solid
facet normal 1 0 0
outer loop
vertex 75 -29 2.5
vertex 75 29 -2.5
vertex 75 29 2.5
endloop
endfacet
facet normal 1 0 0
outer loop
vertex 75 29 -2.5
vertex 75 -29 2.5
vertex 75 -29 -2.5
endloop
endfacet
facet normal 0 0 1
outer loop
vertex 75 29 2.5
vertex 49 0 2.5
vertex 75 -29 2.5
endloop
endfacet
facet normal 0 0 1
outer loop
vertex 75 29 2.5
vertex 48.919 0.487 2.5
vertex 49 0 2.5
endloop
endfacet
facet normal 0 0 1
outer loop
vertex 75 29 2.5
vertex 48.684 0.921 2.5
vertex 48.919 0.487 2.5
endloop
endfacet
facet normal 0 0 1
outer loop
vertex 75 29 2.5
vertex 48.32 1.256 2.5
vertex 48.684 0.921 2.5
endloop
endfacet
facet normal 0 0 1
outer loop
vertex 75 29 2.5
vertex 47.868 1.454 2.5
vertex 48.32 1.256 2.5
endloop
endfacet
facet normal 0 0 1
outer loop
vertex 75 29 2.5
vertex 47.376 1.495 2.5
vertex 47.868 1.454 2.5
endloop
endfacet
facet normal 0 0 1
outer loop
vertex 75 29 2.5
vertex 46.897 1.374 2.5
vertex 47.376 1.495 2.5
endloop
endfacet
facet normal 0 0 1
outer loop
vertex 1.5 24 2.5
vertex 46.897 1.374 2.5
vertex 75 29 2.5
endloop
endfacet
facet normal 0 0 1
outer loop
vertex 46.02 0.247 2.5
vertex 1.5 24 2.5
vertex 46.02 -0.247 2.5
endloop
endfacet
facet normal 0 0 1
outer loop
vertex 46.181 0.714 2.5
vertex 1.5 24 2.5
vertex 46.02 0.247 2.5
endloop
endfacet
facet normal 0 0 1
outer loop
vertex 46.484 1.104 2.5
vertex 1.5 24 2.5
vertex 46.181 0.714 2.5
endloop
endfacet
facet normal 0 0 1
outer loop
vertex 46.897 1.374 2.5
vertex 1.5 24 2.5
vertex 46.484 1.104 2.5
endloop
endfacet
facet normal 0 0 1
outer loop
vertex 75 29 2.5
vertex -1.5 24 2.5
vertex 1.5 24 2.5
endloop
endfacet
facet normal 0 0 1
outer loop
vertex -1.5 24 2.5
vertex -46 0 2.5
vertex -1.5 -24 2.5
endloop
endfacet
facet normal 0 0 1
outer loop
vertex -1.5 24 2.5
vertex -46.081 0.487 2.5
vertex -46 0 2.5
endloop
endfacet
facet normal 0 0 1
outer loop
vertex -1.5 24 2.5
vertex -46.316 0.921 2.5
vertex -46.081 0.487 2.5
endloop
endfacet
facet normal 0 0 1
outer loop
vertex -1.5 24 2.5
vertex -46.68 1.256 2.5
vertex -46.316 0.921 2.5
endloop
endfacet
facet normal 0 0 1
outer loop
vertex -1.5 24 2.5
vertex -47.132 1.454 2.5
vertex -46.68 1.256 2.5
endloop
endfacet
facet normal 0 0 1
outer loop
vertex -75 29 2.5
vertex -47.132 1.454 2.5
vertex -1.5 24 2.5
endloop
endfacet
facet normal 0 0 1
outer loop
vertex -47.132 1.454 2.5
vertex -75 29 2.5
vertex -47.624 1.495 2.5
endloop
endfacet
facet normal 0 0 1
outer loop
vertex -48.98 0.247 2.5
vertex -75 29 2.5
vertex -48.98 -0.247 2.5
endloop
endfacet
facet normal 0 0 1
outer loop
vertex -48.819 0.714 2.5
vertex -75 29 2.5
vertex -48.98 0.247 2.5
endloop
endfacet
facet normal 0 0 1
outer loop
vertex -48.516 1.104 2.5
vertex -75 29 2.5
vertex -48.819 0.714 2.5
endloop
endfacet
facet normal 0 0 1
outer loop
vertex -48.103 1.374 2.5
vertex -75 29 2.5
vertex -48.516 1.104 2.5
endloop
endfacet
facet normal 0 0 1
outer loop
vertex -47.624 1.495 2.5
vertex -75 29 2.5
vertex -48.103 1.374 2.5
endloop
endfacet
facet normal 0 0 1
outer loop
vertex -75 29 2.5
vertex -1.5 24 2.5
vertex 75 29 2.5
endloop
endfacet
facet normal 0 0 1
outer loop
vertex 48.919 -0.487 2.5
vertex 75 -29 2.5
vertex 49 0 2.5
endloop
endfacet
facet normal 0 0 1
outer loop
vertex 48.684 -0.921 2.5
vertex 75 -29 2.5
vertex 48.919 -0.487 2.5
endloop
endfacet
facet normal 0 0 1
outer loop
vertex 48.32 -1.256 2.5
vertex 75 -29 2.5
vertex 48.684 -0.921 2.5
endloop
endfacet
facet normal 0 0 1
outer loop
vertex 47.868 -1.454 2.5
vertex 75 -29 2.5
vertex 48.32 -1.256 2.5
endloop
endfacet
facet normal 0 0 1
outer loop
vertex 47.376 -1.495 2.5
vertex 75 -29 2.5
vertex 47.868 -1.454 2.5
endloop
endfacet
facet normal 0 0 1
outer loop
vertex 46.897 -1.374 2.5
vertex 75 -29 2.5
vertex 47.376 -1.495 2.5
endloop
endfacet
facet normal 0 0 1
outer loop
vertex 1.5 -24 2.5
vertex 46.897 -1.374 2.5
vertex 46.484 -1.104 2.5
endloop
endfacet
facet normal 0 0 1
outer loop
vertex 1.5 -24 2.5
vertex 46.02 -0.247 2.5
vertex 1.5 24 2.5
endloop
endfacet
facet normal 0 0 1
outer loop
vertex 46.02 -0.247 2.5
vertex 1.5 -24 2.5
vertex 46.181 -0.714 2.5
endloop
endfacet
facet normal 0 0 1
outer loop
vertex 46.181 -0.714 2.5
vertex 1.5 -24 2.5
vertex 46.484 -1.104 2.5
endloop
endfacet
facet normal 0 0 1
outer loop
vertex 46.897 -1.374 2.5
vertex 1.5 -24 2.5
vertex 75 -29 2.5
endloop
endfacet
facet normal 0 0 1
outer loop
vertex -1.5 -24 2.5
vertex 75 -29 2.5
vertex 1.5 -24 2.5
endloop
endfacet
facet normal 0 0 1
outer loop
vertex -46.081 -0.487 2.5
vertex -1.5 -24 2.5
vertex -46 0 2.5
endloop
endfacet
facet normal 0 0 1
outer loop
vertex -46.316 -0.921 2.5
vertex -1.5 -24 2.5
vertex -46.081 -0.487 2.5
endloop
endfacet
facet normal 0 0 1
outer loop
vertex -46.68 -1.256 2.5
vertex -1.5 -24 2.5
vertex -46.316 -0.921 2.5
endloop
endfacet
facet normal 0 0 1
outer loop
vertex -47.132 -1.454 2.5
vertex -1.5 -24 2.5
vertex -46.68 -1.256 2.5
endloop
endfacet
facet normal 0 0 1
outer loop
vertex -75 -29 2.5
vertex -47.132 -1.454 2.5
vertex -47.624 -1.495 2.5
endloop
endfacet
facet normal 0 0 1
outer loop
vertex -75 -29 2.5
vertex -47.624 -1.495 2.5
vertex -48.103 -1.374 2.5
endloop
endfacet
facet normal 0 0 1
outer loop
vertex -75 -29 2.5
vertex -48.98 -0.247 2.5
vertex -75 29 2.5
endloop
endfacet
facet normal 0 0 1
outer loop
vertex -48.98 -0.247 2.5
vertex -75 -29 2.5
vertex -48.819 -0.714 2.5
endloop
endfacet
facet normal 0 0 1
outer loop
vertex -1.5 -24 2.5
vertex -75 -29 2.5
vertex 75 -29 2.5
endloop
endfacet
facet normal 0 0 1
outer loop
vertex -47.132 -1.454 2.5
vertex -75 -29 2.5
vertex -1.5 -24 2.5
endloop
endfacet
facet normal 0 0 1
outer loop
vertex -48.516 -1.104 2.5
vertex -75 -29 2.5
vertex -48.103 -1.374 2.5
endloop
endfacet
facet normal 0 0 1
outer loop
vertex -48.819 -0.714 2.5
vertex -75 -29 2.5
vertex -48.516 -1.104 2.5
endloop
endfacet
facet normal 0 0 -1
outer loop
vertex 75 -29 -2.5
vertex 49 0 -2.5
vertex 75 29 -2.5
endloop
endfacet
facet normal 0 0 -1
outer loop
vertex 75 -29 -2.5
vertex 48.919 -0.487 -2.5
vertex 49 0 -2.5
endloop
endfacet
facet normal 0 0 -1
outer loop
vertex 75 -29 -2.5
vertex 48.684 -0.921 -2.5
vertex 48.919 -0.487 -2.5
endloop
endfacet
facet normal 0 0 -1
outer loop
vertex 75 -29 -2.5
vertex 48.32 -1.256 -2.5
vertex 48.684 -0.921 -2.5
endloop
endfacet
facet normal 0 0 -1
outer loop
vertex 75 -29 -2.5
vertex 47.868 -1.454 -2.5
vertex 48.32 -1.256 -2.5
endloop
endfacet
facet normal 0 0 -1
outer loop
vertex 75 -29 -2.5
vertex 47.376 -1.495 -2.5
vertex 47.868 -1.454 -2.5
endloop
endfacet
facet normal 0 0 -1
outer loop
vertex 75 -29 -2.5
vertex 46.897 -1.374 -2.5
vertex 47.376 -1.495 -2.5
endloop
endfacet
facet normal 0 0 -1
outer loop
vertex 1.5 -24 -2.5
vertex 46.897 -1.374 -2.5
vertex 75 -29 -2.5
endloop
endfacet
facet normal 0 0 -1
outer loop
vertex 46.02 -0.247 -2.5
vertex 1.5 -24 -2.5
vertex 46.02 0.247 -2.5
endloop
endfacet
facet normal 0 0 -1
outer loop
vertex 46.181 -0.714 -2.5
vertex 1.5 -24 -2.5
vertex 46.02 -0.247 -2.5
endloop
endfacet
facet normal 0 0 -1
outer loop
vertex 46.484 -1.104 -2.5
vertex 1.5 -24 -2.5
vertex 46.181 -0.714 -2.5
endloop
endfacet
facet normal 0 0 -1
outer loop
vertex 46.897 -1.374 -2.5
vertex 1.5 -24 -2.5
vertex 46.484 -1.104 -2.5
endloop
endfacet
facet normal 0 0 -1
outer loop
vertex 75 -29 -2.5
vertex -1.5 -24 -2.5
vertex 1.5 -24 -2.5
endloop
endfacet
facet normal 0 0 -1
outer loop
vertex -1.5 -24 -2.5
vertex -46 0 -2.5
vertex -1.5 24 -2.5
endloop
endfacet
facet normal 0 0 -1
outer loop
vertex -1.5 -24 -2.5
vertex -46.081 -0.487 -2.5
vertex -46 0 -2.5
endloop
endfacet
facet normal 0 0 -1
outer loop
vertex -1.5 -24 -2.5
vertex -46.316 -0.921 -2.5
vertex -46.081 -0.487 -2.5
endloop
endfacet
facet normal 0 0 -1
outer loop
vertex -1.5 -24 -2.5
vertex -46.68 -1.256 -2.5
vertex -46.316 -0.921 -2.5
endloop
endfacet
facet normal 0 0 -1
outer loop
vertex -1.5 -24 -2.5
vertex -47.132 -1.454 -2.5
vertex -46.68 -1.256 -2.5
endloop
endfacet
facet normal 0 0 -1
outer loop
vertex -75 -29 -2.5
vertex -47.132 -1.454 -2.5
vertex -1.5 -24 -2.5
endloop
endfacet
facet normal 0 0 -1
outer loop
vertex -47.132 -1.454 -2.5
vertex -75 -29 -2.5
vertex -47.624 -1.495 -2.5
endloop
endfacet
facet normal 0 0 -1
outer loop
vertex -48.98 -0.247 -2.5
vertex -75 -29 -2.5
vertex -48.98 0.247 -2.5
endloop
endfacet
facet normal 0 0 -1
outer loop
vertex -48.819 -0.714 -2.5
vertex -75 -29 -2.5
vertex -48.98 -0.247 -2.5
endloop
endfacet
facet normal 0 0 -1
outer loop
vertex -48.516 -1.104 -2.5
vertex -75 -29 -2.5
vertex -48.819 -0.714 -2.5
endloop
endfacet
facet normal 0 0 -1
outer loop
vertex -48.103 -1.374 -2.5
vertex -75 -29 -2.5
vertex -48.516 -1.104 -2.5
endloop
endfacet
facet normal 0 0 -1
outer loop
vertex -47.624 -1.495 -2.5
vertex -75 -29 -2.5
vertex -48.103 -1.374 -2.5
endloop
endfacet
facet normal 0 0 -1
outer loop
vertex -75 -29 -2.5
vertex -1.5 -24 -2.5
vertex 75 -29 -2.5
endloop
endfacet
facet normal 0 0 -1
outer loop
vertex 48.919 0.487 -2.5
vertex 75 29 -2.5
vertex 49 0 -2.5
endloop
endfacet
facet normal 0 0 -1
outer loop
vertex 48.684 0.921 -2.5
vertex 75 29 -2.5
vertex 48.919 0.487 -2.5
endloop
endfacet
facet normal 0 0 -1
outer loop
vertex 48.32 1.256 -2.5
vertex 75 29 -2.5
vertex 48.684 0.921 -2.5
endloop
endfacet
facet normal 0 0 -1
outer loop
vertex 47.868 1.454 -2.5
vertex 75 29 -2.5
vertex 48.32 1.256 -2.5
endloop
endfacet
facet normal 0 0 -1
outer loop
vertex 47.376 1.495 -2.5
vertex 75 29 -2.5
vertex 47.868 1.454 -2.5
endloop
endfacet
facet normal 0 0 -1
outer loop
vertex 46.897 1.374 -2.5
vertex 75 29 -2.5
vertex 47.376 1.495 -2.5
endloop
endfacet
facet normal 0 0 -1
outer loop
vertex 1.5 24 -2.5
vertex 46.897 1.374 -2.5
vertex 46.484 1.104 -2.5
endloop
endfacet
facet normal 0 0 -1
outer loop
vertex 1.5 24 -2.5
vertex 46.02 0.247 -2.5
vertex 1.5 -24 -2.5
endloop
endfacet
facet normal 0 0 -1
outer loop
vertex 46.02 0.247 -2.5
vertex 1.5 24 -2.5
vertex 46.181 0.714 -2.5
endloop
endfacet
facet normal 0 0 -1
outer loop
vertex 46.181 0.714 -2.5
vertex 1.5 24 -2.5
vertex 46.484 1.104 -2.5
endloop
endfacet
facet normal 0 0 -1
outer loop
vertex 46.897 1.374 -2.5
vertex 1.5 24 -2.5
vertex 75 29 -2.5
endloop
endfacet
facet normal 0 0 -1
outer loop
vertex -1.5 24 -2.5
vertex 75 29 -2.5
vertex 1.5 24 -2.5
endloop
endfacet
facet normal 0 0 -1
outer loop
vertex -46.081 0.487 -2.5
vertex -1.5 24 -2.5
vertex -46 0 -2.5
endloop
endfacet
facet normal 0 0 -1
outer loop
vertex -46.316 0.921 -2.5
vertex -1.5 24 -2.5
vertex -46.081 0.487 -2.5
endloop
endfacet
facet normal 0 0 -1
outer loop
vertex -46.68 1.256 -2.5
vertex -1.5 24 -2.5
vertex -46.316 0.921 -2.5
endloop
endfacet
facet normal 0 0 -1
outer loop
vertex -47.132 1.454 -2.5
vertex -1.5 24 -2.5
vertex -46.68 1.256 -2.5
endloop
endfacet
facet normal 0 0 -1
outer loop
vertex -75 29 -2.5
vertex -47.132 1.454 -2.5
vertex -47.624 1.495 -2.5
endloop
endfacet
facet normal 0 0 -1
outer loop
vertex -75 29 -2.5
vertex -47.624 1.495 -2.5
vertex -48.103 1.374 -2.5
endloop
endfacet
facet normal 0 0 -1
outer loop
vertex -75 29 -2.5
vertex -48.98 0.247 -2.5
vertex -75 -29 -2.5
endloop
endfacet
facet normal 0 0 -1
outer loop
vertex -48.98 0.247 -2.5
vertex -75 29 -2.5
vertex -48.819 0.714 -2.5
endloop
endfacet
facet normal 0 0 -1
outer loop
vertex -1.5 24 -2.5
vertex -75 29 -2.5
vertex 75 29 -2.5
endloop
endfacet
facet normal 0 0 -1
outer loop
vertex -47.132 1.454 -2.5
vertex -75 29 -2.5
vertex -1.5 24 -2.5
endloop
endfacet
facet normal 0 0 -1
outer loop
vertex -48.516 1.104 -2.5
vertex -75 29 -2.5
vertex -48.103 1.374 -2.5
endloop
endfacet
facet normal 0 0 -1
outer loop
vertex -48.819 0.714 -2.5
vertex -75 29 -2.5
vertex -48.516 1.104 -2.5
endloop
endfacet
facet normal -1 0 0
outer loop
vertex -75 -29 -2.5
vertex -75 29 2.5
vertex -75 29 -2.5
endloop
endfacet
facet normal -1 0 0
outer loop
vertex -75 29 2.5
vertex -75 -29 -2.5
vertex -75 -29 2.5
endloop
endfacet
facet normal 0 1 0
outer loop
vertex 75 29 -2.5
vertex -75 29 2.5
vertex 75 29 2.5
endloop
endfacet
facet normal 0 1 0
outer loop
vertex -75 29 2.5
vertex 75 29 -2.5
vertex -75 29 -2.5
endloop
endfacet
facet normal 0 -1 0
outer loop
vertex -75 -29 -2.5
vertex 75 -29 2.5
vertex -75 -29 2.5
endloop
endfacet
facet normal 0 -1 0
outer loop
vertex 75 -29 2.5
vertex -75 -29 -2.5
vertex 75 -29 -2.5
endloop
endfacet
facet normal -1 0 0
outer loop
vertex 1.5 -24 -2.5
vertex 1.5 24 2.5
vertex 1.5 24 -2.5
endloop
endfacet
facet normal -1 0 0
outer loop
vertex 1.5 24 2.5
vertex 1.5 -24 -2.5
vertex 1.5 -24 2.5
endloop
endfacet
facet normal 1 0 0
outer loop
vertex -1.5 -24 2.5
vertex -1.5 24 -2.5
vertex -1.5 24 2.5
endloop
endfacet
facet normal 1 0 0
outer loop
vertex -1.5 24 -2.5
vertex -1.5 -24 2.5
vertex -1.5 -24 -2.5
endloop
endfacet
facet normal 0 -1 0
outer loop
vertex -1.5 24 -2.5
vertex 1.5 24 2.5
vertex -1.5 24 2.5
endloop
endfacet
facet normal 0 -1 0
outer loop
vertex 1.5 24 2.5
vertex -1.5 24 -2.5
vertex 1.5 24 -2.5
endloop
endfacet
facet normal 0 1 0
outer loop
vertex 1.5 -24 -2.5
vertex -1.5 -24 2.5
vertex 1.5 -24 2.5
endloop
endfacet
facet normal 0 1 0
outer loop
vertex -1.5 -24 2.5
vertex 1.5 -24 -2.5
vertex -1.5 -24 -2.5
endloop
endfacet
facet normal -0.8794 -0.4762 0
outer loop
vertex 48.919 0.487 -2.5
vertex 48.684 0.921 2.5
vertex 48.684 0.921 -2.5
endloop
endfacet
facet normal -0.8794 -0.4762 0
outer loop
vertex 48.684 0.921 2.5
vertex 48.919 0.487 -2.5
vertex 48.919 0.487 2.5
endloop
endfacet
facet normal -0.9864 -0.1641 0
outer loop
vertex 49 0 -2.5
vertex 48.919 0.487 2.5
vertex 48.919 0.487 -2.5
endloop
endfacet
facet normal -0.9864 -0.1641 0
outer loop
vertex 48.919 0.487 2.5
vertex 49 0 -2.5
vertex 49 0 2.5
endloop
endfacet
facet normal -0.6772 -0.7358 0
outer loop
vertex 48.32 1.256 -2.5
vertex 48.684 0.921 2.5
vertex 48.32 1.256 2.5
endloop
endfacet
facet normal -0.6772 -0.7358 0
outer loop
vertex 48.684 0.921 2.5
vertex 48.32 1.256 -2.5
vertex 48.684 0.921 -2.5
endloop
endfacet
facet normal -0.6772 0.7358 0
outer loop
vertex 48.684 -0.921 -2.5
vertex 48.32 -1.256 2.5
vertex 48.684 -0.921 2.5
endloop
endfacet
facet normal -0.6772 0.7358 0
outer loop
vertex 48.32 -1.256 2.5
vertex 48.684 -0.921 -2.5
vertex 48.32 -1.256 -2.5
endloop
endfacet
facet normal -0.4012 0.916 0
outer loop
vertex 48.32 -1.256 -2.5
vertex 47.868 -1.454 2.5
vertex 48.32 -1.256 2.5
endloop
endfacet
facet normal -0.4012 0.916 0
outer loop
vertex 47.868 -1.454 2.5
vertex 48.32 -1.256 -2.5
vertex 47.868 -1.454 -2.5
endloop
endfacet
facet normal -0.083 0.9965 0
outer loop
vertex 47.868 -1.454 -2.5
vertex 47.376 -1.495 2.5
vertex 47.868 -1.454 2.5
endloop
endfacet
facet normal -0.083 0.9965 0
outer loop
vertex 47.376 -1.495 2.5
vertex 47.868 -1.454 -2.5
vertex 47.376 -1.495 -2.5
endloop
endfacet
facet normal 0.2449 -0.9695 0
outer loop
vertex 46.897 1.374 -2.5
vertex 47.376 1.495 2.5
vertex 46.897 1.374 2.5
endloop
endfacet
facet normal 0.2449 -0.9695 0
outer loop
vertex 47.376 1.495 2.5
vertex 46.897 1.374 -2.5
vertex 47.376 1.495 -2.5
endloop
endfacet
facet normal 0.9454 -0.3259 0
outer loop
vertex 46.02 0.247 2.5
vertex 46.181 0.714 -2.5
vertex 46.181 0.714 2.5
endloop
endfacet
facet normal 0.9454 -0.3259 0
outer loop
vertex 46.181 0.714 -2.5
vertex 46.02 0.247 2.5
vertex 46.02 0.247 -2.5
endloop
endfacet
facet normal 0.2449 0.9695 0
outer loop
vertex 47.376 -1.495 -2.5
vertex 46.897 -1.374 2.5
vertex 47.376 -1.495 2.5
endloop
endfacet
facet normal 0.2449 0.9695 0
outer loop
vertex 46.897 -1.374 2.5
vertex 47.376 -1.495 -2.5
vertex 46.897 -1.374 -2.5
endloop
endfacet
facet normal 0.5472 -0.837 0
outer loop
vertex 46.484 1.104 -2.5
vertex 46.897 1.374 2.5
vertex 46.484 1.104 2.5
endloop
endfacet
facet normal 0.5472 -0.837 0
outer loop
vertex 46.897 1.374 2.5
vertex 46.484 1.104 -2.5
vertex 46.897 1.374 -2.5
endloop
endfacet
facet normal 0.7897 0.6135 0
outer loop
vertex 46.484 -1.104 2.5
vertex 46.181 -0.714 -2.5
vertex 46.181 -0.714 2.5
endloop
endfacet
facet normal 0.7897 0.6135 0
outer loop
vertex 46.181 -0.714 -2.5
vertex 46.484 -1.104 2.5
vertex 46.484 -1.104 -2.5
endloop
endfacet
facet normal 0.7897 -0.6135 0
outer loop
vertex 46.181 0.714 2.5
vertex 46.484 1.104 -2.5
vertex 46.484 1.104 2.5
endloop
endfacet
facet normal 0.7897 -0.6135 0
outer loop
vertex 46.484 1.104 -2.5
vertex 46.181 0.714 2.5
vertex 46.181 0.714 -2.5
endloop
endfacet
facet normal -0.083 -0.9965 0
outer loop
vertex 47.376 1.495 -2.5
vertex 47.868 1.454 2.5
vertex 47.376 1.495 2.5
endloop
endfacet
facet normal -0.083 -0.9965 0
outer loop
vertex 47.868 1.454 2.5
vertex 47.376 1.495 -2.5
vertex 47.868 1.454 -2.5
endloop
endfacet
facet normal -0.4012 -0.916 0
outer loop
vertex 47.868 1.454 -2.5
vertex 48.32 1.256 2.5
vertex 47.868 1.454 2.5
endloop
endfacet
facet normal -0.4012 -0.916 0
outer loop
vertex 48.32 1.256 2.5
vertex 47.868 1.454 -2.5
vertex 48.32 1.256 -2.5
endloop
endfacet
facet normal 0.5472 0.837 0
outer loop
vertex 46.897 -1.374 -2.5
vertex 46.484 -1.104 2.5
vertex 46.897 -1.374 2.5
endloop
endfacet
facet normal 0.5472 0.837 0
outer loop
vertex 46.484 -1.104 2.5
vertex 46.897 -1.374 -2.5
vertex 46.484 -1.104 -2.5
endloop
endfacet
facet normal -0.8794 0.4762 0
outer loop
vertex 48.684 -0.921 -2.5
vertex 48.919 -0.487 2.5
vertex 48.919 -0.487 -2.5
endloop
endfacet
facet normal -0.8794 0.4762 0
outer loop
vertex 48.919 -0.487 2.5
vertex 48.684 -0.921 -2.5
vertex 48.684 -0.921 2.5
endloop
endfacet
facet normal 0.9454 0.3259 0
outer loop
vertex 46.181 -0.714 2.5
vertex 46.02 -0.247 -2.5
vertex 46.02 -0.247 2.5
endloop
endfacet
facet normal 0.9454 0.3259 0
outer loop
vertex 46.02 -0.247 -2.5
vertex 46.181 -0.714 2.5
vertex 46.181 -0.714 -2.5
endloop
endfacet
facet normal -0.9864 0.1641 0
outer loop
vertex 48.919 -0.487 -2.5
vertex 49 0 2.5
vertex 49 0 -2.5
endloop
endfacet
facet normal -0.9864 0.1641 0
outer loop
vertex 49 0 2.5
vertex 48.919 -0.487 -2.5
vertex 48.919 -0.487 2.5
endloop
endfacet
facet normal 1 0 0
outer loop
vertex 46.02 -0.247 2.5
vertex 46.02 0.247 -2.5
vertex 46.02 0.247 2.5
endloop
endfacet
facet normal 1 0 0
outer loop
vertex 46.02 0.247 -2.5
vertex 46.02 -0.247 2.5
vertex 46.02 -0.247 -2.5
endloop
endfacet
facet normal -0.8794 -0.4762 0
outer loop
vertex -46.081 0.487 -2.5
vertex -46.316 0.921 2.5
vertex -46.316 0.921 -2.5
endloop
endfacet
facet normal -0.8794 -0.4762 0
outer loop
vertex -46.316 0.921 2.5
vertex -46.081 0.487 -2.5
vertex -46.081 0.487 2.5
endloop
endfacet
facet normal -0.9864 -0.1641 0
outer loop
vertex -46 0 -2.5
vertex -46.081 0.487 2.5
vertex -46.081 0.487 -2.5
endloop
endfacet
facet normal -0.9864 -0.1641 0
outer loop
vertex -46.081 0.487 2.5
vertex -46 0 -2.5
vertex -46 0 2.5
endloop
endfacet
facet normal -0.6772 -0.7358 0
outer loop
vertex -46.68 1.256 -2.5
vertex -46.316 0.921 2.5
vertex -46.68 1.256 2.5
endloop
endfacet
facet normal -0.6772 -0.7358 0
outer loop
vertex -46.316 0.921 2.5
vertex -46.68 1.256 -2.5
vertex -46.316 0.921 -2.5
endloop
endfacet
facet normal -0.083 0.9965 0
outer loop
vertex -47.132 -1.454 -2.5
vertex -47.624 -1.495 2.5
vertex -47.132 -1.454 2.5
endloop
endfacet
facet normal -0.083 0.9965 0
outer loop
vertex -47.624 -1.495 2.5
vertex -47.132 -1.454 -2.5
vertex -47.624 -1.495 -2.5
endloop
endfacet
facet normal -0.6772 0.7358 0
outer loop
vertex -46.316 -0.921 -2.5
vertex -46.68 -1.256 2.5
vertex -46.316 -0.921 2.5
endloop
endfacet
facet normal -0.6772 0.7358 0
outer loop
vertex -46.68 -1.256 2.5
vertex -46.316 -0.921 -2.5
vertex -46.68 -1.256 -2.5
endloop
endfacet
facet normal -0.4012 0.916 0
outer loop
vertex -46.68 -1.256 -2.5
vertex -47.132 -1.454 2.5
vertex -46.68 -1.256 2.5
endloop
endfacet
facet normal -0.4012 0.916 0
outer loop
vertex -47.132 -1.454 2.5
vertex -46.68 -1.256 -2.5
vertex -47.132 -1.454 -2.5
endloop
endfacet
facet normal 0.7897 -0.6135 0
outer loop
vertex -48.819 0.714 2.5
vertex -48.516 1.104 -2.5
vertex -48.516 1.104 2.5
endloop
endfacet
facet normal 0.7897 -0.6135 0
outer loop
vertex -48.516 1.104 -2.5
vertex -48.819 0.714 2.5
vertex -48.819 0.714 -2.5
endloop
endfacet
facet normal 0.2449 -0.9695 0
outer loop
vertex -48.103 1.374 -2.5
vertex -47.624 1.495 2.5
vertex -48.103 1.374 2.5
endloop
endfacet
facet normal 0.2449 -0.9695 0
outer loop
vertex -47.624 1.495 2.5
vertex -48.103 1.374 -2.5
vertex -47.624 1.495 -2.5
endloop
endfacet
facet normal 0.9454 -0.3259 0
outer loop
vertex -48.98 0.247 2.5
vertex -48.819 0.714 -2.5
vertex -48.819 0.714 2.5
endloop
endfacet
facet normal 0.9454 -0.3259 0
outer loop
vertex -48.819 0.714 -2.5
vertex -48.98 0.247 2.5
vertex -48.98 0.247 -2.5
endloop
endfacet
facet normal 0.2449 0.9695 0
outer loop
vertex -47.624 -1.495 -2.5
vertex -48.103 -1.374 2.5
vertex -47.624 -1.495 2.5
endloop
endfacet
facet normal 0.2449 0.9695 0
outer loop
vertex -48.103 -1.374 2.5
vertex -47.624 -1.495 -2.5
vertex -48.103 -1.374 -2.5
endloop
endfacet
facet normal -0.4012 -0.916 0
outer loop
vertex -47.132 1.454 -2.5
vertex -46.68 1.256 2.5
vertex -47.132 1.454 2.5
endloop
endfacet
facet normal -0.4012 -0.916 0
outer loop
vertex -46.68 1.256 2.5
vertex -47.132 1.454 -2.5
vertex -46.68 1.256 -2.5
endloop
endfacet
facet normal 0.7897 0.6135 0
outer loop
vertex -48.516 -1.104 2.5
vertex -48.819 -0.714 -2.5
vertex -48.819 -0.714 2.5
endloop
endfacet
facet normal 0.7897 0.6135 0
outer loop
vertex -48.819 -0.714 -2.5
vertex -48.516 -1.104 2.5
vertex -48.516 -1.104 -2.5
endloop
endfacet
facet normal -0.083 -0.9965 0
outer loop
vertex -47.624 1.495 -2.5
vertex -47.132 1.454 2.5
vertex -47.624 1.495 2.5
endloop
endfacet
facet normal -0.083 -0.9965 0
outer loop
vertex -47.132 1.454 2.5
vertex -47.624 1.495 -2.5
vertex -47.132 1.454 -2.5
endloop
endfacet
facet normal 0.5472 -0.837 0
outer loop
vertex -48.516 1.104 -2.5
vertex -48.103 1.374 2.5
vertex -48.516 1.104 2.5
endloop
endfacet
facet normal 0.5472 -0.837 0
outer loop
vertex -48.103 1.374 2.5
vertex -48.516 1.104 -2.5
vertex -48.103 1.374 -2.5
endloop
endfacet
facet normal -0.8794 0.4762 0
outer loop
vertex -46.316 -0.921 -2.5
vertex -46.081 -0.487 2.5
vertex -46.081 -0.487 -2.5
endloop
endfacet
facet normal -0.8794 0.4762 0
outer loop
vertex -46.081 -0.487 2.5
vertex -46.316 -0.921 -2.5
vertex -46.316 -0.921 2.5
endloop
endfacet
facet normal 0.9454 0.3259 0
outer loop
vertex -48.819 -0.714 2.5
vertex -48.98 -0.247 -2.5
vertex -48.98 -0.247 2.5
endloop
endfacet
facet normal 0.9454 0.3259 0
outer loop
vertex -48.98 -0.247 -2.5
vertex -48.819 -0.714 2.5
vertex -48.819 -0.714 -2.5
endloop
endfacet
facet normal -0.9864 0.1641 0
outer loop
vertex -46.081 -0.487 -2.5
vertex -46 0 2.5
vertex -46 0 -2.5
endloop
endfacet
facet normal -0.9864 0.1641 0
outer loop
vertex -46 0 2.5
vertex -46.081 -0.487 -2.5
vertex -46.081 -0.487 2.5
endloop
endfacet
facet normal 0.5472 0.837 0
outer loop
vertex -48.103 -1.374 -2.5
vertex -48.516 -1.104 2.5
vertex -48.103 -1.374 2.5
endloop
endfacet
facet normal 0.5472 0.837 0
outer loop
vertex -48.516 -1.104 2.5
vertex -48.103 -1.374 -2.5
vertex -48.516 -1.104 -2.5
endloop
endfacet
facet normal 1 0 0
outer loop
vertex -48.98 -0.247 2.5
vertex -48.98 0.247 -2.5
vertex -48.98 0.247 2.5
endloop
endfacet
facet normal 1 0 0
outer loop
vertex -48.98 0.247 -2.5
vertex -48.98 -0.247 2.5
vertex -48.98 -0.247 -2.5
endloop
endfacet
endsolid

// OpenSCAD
drawer_width_small = 150;  // 5 15/16
drawer_height_small = 58;  // 2  5/16
drawer_height_large = 141; // 5  9/16
door_width = 70; // 2 3/4
thickness = 5;
hole_distance = 95; // 3 3/4
hole_diameter = 3;
handle_overhang = 28.5;
part = "drawer base"; // ["drawer base", "drawer height spacer", "door"]

$fa = $preview ? 15 : 1;
$fs = $preview ? 3 : 0.5;

if (part == "drawer base") {
	drawer_base();
}
else if (part == "drawer height spacer") {
	drawer_height_spacer();
}
else if (part == "door") {
	door();
}

module drawer_base() {
	difference() {
		cube([drawer_width_small, drawer_height_small, thickness], center=true);
		cube([hole_diameter, drawer_height_small-thickness*2, thickness*2], center=true);
		translate([hole_distance/2, 0, 0])
			cylinder(d=hole_diameter, h=thickness+2, center=true);
		translate([-hole_distance/2, 0, 0])
			cylinder(d=hole_diameter, h=thickness+2, center=true);
	}
}

module drawer_height_spacer() {
	cube([
		drawer_width_small,
		(drawer_height_large-drawer_height_small)/2,
		thickness
	]);
}

module door() {
	height = hole_distance+door_width+handle_overhang*2;
	translate([0, 0, -thickness/2])
		linear_extrude(thickness)
			difference() {
				translate([0, -door_width/2, 0])
					square([door_width, height], center=true);
				translate([0, hole_distance/2, 0])
					circle(d=hole_diameter);
				translate([0, -hole_distance/2, 0])
					circle(d=hole_diameter);
			}
	translate([door_width/2+thickness/2, -door_width/2, 0])
		cube([thickness, height, thickness*5], center=true);
	translate([thickness/2, -height/2-door_width/2-thickness/2, 0])
		cube([door_width+thickness, thickness, thickness*5], center=true);
}
